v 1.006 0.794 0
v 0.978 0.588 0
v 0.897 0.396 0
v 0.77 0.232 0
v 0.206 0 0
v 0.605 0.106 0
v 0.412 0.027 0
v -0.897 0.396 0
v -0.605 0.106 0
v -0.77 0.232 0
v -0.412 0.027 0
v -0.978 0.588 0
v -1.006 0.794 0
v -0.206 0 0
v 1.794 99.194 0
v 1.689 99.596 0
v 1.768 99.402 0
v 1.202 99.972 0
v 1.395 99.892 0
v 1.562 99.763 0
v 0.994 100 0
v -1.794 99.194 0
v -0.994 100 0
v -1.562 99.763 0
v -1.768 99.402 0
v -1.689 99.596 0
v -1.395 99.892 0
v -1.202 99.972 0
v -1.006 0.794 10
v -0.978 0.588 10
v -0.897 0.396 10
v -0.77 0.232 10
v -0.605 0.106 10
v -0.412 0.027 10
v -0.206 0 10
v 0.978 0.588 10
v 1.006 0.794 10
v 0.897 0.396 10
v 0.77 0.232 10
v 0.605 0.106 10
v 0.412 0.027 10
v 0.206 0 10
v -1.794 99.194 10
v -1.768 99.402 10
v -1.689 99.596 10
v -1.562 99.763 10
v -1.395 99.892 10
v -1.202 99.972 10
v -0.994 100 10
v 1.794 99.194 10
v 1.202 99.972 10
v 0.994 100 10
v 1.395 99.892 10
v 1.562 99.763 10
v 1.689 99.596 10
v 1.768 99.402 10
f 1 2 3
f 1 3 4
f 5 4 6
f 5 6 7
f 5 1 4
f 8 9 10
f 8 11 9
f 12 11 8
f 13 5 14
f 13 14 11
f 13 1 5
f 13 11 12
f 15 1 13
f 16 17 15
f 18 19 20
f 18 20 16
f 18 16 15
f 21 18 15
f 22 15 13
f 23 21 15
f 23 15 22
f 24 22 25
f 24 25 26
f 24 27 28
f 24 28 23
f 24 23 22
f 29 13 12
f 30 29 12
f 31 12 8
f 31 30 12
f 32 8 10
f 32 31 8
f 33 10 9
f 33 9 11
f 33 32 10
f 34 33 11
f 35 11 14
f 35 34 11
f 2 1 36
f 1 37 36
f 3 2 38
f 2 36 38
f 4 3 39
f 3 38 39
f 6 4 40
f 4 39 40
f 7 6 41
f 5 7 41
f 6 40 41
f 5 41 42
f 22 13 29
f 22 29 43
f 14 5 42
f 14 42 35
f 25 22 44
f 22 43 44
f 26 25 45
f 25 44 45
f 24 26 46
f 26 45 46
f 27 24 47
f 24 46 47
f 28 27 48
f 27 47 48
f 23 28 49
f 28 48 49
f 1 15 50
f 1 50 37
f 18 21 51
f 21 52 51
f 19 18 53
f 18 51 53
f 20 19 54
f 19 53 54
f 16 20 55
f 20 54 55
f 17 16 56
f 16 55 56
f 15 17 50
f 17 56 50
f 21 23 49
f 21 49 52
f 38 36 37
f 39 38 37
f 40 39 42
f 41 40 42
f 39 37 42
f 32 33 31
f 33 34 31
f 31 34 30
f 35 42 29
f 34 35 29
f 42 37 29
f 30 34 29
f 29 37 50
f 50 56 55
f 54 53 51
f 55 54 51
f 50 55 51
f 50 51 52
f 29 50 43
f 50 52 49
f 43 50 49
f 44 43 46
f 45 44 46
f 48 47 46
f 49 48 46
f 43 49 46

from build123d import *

# Parameters (mm, degrees)
PAD_DEPTH = 10
FILLET_R  = 0.8


with BuildPart() as part:
    # Sketch → Pad (new body)
    with BuildSketch(Plane.XY):
        Polygon((-1, 0), (-1.8, 100), (1.8, 100), (1, 0), align=None)
    extrude(amount=PAD_DEPTH)

    # Fillet
    fillet_edges = [part.edges().sort_by_distance(p)[0] for p in [
        (-1.8, 100, 5),
        (1.8, 100, 5),
        (-1, 0, 5),
        (1, 0, 5),
    ]]
    fillet(fillet_edges, radius=FILLET_R)


solid = part.part
